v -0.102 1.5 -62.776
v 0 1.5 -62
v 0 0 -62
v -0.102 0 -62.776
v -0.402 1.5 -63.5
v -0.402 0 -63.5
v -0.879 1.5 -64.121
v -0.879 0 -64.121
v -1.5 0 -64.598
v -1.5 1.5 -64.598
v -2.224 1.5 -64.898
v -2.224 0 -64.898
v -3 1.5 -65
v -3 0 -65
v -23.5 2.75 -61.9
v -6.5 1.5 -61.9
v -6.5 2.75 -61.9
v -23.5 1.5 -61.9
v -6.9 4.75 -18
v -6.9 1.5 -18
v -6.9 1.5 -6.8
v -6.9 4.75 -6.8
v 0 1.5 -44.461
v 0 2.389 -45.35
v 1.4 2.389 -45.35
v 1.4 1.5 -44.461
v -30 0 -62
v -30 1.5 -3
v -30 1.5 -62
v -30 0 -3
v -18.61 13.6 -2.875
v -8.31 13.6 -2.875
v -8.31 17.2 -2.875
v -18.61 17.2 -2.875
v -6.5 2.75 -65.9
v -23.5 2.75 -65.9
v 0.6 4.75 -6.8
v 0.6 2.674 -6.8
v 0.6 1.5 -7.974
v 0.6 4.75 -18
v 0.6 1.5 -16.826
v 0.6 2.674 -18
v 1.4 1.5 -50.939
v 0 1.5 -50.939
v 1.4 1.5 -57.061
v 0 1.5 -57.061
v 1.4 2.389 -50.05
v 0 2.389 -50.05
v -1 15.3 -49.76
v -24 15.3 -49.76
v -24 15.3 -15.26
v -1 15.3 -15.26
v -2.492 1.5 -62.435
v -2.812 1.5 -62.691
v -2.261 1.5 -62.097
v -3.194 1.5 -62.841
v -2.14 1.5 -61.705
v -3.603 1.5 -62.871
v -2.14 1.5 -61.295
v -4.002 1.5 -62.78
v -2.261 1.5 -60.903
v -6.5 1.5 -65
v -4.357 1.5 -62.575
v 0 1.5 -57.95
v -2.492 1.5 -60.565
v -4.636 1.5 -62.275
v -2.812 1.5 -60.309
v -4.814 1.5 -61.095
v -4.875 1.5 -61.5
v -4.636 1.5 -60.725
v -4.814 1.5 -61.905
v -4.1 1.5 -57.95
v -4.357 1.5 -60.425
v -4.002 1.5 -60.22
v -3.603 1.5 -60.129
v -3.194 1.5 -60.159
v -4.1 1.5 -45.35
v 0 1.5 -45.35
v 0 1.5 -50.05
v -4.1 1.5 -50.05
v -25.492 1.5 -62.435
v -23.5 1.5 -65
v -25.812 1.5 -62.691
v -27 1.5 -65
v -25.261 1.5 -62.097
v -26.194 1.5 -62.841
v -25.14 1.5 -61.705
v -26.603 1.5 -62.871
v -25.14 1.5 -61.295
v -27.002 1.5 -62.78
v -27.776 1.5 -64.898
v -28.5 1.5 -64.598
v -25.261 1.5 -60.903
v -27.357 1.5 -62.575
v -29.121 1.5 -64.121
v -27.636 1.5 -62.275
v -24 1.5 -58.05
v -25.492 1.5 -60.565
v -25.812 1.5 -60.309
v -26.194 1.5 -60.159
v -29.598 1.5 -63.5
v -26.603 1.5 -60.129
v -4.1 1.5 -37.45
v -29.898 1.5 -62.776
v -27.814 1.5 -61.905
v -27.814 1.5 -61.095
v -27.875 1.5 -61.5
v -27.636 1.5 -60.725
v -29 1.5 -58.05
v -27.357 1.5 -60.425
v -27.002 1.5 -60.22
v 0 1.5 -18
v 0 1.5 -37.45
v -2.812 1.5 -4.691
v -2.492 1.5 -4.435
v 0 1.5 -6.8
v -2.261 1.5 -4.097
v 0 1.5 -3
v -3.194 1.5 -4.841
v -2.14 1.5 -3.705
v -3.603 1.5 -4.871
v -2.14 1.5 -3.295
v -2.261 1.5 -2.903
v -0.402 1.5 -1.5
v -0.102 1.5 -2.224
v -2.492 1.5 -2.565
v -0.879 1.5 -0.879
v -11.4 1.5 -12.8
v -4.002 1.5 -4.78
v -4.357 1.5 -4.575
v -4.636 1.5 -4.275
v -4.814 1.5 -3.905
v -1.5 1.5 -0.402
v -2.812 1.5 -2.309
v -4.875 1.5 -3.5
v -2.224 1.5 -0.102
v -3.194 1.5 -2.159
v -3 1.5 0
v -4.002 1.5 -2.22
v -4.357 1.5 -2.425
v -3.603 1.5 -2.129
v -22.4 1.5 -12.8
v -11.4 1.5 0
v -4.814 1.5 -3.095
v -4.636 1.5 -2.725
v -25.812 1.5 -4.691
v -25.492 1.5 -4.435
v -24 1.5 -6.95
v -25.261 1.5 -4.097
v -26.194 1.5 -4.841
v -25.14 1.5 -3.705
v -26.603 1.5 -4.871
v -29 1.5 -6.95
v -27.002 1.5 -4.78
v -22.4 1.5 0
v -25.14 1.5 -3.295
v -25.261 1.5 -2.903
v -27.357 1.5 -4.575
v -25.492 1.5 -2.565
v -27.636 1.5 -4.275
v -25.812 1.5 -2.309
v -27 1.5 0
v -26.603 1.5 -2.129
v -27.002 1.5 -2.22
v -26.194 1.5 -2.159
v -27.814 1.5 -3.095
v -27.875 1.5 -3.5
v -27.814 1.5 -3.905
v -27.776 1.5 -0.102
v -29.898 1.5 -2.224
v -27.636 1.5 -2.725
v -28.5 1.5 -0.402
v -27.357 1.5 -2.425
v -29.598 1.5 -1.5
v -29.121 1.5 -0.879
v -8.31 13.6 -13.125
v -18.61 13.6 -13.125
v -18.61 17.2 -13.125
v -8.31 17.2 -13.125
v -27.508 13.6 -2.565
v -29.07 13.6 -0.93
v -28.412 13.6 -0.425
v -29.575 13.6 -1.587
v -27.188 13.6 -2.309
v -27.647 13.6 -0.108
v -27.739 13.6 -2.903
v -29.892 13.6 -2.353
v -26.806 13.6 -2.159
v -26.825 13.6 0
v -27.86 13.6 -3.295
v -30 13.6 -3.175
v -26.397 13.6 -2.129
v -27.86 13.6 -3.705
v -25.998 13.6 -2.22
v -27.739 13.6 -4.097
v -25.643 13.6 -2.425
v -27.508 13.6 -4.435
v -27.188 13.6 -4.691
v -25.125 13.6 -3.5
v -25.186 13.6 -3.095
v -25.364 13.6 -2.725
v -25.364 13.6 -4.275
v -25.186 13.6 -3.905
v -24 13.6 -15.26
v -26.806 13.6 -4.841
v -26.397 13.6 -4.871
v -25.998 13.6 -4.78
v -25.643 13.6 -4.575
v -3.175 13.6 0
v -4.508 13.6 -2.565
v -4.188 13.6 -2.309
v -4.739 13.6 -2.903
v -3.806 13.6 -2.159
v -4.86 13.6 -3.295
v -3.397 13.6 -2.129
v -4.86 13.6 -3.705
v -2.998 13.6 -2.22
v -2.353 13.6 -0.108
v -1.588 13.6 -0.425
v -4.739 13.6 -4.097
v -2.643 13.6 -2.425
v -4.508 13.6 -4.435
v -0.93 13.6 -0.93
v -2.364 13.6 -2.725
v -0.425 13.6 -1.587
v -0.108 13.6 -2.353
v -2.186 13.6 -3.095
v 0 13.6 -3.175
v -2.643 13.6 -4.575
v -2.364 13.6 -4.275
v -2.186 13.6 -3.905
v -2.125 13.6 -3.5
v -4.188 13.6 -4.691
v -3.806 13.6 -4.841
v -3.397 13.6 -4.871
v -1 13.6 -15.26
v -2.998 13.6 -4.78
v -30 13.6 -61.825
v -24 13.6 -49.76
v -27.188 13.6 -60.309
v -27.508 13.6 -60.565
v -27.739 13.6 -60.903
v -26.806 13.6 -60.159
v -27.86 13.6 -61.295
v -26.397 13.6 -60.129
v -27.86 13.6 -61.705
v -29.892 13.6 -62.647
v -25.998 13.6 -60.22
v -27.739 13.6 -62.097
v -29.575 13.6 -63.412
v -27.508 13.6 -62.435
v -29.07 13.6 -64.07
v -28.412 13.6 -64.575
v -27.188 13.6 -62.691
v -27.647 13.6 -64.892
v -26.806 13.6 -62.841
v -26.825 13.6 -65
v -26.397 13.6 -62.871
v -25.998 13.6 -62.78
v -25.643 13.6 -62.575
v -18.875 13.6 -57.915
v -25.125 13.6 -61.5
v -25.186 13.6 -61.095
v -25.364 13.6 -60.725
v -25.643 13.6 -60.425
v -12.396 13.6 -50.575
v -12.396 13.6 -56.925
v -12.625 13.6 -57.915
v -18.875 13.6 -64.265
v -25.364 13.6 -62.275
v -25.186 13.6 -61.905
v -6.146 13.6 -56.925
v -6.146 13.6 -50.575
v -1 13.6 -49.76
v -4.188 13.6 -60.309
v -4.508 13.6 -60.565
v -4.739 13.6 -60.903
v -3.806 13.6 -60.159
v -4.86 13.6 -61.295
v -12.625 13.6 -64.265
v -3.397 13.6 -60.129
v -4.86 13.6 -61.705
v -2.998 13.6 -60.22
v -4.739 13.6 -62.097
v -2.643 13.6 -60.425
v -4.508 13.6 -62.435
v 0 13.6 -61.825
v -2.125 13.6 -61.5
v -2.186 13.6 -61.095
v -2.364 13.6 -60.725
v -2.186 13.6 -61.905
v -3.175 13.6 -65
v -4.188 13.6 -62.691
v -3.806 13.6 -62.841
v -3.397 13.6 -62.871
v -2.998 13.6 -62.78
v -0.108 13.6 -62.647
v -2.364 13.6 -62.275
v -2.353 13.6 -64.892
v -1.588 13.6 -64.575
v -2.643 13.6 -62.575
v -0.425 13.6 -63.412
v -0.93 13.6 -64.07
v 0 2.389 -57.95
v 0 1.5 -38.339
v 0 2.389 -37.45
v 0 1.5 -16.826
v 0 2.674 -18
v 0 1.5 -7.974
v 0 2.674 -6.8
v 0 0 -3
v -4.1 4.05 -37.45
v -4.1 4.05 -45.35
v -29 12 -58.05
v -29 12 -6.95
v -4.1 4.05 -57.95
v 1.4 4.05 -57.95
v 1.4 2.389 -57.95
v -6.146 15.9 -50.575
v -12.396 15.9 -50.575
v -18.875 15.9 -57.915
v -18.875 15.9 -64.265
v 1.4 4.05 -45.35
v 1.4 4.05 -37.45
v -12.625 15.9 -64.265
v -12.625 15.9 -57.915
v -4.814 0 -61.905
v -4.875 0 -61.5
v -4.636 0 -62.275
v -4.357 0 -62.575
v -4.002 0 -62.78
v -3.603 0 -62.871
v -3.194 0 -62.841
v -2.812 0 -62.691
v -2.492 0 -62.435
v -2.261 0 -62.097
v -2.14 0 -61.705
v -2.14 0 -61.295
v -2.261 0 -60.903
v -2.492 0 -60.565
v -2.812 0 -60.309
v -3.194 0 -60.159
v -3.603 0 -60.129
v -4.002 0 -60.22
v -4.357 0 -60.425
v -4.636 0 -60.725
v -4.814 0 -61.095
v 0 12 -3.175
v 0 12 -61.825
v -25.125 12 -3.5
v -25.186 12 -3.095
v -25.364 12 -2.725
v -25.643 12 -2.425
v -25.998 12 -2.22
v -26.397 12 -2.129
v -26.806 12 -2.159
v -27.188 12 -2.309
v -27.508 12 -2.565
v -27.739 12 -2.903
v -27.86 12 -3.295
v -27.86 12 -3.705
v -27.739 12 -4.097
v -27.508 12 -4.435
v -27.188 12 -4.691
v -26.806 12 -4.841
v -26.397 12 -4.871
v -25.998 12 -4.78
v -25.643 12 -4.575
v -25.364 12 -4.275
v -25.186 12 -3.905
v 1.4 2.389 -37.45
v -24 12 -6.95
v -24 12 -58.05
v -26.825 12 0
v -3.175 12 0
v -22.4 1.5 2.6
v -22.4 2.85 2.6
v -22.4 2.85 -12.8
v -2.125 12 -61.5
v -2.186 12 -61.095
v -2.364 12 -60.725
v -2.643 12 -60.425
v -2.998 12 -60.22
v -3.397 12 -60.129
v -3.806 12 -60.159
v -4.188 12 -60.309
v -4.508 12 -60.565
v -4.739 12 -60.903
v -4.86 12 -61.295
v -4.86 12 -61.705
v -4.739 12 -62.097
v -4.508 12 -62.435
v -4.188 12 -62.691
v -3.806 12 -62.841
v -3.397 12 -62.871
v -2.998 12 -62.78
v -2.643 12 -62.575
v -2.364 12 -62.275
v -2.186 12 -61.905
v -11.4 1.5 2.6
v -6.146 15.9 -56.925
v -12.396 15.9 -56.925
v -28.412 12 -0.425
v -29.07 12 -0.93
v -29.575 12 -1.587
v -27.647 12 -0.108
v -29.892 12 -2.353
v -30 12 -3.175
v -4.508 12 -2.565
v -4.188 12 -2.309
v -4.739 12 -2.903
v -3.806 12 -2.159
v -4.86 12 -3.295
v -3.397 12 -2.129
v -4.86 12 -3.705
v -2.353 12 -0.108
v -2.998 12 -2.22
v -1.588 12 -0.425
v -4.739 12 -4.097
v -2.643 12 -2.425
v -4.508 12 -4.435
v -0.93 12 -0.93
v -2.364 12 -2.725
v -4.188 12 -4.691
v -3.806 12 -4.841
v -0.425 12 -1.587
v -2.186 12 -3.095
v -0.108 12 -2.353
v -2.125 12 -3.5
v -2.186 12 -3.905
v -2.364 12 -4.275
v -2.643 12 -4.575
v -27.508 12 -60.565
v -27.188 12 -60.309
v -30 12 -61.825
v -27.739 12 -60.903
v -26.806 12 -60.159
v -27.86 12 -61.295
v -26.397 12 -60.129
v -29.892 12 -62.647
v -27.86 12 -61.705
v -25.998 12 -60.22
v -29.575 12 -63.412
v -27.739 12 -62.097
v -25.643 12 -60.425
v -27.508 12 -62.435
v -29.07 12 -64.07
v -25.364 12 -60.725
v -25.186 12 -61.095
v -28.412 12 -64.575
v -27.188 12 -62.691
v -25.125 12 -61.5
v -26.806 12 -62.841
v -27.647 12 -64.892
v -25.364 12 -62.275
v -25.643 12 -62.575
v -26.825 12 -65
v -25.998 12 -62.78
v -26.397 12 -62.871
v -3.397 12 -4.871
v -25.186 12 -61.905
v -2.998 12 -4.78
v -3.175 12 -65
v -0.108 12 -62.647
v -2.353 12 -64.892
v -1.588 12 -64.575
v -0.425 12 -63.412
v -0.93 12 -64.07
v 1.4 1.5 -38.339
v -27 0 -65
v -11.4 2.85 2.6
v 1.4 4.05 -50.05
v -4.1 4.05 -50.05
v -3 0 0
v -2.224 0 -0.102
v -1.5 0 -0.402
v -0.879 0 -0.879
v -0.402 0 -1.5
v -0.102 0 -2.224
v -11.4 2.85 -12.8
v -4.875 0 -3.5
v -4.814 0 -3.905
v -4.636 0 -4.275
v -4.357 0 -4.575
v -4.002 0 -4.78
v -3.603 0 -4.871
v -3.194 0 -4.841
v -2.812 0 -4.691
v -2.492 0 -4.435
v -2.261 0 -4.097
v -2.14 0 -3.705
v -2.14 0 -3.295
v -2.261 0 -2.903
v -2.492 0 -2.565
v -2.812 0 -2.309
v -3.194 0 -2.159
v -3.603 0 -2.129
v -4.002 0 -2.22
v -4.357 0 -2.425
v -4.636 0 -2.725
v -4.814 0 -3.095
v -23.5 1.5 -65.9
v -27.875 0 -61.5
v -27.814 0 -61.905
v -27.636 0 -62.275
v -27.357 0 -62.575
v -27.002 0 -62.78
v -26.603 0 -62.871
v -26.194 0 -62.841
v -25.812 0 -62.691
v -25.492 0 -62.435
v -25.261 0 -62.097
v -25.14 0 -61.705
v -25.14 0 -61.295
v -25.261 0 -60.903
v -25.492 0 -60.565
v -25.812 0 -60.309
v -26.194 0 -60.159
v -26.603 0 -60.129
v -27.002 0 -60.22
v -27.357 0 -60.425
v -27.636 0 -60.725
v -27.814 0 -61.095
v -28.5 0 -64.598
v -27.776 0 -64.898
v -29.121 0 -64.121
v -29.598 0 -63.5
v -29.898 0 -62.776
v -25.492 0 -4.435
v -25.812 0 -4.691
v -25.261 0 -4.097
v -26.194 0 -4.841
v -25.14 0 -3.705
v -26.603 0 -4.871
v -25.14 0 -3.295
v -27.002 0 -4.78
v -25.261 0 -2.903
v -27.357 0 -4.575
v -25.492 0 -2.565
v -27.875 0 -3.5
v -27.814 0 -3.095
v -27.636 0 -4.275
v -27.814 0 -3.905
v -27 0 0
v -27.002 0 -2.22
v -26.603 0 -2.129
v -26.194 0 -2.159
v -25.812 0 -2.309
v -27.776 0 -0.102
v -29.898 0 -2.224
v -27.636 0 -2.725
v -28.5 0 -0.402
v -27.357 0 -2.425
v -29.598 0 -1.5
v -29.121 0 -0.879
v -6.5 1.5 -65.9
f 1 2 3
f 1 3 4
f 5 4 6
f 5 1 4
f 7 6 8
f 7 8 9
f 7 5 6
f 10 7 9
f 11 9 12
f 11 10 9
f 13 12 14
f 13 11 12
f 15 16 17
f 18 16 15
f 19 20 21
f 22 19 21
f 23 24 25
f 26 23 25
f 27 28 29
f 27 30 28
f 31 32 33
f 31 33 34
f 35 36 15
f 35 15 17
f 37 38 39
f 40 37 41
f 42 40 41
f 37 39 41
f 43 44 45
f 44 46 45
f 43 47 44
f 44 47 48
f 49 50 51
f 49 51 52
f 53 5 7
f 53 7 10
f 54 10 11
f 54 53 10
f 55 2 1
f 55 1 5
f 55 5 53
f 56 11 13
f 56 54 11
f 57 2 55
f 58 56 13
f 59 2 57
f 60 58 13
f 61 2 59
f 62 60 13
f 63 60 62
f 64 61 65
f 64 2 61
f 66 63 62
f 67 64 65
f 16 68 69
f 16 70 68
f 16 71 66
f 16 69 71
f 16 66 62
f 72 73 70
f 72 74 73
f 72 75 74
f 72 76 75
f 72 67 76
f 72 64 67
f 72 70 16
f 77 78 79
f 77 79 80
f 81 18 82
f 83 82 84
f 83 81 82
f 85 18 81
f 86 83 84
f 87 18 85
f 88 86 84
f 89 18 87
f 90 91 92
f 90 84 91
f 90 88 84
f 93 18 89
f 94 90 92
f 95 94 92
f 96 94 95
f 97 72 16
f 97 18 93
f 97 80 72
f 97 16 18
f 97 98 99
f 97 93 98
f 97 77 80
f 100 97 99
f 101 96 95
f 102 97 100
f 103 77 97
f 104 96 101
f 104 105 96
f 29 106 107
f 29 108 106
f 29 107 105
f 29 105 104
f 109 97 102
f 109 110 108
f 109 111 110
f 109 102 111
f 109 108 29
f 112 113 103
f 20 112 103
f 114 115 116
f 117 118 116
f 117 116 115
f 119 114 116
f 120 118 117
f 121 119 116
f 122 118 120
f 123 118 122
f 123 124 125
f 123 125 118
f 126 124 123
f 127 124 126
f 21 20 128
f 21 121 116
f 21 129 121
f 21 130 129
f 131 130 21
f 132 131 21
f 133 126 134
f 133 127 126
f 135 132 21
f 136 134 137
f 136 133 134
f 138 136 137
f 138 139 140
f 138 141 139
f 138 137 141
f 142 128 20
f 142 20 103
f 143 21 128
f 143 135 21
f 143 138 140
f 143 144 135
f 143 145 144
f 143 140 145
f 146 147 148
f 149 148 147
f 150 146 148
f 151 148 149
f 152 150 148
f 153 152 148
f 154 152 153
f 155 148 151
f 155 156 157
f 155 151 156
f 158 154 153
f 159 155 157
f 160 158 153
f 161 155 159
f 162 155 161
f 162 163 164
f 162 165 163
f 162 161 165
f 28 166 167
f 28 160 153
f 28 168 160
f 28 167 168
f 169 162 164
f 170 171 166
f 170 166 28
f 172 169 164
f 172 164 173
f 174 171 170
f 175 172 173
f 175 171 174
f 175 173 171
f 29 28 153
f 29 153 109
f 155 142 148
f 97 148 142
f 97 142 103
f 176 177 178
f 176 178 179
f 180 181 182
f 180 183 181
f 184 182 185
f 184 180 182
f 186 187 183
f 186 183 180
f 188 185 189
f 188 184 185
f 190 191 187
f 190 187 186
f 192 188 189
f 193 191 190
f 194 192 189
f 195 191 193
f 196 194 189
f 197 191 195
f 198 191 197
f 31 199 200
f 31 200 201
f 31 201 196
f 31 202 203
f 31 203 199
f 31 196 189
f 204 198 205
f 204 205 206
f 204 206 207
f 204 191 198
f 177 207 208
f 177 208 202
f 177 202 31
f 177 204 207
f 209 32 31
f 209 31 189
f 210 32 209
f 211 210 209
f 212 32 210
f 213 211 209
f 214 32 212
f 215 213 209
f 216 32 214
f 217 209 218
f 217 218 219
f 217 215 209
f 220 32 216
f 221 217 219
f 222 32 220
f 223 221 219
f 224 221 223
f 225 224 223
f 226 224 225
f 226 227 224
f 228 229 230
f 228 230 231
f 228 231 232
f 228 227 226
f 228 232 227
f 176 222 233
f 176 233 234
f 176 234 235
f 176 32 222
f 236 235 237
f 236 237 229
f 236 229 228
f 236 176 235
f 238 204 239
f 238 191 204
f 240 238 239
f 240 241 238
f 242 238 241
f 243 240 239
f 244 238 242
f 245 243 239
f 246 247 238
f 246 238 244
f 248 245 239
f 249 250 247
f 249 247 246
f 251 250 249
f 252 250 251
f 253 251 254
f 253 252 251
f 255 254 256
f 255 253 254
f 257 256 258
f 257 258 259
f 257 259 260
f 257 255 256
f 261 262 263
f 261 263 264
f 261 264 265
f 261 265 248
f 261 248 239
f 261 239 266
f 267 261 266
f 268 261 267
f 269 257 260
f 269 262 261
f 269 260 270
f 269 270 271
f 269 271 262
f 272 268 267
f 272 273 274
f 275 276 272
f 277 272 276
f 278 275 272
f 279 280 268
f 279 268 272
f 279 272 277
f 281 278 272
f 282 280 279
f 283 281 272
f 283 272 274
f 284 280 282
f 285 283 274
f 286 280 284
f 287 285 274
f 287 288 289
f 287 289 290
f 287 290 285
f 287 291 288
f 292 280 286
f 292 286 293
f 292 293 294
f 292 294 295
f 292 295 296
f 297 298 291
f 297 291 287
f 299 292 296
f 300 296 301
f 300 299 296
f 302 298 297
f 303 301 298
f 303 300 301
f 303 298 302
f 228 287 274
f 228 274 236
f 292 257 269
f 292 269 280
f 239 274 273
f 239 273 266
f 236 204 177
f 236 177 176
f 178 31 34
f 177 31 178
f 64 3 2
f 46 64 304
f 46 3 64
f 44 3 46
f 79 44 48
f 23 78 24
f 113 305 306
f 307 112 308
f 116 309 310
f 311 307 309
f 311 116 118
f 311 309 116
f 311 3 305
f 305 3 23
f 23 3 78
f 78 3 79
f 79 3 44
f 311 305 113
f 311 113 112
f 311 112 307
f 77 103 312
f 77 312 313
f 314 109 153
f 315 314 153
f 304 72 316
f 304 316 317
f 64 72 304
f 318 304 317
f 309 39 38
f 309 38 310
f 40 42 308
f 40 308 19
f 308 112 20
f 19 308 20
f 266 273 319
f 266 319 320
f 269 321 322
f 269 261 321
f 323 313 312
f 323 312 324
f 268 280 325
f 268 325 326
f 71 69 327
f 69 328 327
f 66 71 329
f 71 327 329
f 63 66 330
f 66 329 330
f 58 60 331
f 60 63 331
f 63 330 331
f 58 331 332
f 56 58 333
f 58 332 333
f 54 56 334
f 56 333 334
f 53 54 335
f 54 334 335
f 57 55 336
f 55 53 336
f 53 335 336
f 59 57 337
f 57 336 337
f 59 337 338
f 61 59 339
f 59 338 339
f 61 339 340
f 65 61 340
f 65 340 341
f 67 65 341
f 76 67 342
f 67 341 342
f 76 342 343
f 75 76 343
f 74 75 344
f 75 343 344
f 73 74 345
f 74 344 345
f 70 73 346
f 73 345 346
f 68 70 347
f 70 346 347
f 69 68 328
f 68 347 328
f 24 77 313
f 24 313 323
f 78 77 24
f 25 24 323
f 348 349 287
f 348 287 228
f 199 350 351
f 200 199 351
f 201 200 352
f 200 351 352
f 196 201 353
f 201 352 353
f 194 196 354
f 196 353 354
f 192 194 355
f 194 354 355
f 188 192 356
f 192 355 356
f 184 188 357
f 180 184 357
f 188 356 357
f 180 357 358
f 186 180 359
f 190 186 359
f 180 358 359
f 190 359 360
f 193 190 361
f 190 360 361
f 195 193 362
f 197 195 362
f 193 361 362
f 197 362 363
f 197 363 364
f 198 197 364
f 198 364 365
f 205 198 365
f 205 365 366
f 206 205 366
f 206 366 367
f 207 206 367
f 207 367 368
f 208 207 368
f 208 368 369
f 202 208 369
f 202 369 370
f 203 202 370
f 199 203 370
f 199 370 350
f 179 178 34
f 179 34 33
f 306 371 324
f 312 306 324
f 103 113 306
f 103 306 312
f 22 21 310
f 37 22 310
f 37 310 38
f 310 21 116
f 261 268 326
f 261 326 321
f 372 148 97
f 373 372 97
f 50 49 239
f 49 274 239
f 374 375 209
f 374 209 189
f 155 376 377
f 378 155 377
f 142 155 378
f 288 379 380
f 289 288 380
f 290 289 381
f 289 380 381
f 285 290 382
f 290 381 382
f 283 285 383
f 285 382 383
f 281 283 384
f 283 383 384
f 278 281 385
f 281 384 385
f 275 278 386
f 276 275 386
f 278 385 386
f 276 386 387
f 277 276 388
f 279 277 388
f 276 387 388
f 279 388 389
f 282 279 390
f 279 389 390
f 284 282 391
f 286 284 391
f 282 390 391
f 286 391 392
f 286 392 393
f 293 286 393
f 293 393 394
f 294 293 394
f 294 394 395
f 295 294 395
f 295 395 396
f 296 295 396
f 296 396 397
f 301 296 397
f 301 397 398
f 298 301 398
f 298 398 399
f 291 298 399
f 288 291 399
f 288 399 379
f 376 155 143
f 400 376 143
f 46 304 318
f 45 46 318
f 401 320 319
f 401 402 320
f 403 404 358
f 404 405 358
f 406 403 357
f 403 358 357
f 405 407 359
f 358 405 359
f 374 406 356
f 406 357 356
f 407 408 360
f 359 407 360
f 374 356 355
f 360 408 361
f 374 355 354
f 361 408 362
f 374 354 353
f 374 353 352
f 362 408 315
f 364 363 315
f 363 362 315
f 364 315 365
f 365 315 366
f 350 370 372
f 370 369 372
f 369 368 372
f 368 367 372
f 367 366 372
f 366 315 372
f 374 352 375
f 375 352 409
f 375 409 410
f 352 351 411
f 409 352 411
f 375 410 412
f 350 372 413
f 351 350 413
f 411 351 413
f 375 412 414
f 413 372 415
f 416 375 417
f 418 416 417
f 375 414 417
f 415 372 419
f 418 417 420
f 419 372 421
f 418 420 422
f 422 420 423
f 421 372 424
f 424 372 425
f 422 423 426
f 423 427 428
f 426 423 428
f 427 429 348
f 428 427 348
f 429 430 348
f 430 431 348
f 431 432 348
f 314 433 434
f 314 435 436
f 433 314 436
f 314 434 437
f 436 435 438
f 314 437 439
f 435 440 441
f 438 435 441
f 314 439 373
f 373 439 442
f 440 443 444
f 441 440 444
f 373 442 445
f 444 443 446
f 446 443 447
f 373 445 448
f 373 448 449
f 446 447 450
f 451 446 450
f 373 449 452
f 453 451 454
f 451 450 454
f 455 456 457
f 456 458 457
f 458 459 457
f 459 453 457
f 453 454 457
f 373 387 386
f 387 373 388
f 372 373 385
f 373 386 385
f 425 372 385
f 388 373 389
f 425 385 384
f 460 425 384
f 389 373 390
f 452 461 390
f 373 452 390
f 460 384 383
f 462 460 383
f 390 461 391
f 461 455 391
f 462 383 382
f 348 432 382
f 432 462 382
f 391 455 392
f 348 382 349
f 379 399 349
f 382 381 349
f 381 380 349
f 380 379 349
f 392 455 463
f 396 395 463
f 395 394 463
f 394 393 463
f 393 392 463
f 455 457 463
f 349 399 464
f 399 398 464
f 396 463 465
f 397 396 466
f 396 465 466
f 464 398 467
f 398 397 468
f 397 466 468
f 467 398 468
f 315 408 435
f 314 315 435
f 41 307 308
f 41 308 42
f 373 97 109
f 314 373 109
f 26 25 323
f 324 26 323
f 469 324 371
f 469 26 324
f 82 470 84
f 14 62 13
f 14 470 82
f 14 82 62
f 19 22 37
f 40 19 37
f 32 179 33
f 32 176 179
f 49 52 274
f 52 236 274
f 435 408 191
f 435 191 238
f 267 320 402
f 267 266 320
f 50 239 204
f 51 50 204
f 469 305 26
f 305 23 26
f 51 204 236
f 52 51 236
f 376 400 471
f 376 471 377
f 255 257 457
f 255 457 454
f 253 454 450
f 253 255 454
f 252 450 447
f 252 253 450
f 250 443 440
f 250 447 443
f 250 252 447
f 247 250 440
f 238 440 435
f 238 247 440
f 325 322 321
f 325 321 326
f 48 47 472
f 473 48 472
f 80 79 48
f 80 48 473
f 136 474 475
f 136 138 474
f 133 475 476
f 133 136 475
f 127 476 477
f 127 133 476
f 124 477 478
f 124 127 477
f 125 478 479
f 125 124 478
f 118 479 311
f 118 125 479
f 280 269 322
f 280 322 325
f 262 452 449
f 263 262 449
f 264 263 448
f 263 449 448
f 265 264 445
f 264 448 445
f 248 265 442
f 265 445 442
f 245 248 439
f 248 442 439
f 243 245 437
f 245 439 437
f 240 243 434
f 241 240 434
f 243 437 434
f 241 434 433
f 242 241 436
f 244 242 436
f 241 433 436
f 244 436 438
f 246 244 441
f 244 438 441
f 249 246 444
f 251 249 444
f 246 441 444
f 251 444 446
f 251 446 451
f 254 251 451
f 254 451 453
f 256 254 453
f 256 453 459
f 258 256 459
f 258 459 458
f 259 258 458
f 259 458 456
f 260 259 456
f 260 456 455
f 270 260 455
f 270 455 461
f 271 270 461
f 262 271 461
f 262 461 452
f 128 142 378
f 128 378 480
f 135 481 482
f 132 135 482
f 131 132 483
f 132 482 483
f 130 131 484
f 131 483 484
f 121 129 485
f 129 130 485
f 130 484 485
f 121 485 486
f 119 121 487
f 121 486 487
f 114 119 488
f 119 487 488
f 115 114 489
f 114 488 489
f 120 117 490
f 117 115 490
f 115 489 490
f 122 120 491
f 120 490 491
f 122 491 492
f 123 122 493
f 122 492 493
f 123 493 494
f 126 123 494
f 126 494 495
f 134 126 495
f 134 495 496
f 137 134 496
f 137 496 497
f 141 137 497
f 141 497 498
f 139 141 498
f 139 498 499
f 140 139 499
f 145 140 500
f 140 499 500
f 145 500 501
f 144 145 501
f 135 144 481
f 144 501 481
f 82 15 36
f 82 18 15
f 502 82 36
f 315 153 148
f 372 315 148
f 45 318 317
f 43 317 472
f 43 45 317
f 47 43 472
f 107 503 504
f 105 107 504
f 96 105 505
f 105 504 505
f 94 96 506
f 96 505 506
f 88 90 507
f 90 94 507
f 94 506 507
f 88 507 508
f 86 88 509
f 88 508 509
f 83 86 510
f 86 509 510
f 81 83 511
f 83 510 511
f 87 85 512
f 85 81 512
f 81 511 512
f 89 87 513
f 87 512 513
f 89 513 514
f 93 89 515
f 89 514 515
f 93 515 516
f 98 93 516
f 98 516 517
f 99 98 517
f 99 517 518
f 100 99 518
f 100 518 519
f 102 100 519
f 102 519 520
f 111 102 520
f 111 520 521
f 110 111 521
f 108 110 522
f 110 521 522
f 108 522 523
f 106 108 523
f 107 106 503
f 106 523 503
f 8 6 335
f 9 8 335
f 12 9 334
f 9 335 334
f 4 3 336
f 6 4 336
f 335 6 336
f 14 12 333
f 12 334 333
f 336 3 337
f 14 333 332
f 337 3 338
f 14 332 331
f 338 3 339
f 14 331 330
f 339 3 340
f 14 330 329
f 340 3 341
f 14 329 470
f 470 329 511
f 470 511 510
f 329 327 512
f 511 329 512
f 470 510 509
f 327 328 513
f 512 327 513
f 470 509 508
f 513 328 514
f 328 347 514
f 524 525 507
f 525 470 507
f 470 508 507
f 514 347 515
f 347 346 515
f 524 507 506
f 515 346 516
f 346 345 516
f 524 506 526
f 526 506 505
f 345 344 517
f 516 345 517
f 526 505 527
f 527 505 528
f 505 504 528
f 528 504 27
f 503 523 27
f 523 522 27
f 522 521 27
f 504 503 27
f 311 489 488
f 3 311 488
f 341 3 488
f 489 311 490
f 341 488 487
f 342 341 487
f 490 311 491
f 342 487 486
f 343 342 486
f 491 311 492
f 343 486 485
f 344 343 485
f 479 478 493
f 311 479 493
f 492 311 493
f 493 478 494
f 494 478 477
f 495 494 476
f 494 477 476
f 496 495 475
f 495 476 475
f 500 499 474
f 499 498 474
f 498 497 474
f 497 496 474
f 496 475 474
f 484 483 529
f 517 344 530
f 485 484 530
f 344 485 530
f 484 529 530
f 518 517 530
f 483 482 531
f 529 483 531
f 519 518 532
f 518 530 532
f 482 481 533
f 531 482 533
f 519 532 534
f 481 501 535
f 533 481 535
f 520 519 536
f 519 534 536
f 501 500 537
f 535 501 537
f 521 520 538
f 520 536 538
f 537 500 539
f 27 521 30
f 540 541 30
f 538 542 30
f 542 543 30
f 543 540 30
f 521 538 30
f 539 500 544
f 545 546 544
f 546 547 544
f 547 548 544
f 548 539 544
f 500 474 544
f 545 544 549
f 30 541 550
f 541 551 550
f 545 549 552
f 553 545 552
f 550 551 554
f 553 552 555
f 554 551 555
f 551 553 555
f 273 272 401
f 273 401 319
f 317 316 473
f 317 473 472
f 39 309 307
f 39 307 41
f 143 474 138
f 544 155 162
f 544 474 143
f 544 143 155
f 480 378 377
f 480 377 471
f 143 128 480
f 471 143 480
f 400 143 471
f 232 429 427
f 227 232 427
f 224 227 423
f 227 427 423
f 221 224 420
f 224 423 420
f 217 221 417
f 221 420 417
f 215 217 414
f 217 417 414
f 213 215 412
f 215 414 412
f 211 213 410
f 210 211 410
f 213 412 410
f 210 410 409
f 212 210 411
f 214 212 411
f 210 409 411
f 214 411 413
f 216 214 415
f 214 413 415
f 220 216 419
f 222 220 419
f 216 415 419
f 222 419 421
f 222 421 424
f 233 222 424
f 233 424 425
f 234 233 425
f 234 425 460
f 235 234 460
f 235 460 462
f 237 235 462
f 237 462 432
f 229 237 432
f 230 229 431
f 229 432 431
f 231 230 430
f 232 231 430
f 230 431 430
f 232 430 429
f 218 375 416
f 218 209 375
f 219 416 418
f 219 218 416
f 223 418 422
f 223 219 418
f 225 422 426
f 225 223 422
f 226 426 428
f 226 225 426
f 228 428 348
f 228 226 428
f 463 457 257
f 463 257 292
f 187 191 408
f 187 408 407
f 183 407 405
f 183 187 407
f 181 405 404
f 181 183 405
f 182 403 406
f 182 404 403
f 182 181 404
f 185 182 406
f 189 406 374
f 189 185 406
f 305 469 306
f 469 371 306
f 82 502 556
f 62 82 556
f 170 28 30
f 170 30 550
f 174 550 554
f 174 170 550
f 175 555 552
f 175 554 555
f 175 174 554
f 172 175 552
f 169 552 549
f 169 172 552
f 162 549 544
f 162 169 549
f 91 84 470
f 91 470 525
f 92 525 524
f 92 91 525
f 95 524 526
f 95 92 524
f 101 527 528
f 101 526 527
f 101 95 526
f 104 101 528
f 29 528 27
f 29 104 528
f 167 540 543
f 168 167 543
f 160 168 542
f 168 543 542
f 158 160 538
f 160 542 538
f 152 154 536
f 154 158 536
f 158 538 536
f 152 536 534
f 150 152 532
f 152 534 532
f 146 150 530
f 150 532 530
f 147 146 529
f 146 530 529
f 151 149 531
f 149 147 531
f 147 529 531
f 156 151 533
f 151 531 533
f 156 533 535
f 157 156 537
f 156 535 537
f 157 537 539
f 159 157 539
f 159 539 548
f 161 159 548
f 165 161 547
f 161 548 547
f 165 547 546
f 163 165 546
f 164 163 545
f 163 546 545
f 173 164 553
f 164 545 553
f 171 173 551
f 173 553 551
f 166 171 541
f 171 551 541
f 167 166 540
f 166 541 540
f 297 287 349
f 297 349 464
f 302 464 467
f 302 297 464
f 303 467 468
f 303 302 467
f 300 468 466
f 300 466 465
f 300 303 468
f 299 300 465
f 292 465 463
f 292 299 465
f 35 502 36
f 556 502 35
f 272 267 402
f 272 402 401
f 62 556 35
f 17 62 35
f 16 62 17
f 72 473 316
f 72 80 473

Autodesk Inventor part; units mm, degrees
ref_plane "YZ Plane" through (0, 0, 0) normal (1, 0, 0) x (0, 1, 0)
ref_plane "XZ Plane" through (0, 0, 0) normal (0, 1, 0) x (-1, 0, 0)
ref_plane "XY Plane" through (0, 0, 0) normal (0, 0, 1) x (1, 0, 0)
sketch "Sketch1" plane through (0, 0, 0) normal (0, 1, 0) x (-1, 0, 0)
  line L0 (0, 0) -> (30, 0)
  line L1 (30, 0) -> (30, -65)
  line L2 (30, -65) -> (0, -65)
  line L3 (0, -65) -> (0, 0)
  circle A0 centre (26.5, -3.5) radius 1.375
  circle A1 centre (3.5, -3.5) radius 1.375
  circle A2 centre (26.5, -61.5) radius 1.375
  circle A3 centre (3.5, -61.5) radius 1.375
  line L4 (15, 0) -> (15, -65)
  line L5 (30, -32.5) -> (0, -32.5)
  dimension "d0" = 65
  dimension "d1" = 30
  dimension "d2" = 3.5
  dimension "d3" = 3.5
  dimension "d4" = 3.5
  dimension "d5" = 3.5
  dimension "d6" = 3.5
  dimension "d7" = 3.5
  dimension "d8" = 3.5
  dimension "d9" = 3.5
  dimension "d10" = 2.75
  dimension "d11" = 2.75
  dimension "d12" = 2.75
  dimension "d13" = 2.75
  dimension "d14" = 15
  dimension "d15" = 32.5
extrude "Extrusion1" add sketch "Sketch1" along normal blind 1.5
fillet "Fillet1" radius 3 4 edges at (-30, 0.75, 0) (0, 0.75, 0) (0, 0.75, -65) (-30, 0.75, -65)
sketch "Sketch2" plane through (0, 1.5, 0) normal (0, 1, 0) x (1, 0, 0)
  line L0 (-6.9, 6.8) -> (0.6, 6.8)
  line L1 (0.6, 6.8) -> (0.6, 18)
  line L2 (0.6, 18) -> (-6.9, 18)
  line L3 (-6.9, 18) -> (-6.9, 6.8)
  line L4 (-27, 0) -> (-3, 0) projected
  line L5 (-15, 0) -> (-15, 64.9233)
  line L6 (-30, 62) -> (-30, 3) projected
  line L7 (0.6, 12.4) -> (-6.9, 12.4)
  line L8 (-4.1, 57.95) -> (1.4, 57.95)
  line L9 (1.4, 57.95) -> (1.4, 50.05)
  line L10 (1.4, 50.05) -> (-4.1, 50.05)
  line L11 (-4.1, 50.05) -> (-4.1, 57.95)
  line L12 (-4.1, 45.35) -> (1.4, 45.35)
  line L13 (1.4, 45.35) -> (1.4, 37.45)
  line L14 (1.4, 37.45) -> (-4.1, 37.45)
  line L15 (-4.1, 37.45) -> (-4.1, 45.35)
  line L16 (-4.1, 41.4) -> (1.4, 41.4)
  line L17 (-4.1, 54) -> (1.4, 54)
  line L18 (-22.4, 12.8) -> (-11.4, 12.8)
  line L19 (-11.4, 12.8) -> (-11.4, -2.6)
  line L20 (-11.4, -2.6) -> (-22.4, -2.6)
  line L21 (-22.4, -2.6) -> (-22.4, 12.8)
  line L22 (-16.9, 12.8) -> (-16.9, -2.6)
  line L23 (0, 3) -> (0, 62) projected
  line L24 (-23.5, 65.9) -> (-6.5, 65.9)
  line L25 (-6.5, 65.9) -> (-6.5, 61.9)
  line L26 (-6.5, 61.9) -> (-23.5, 61.9)
  line L27 (-23.5, 61.9) -> (-23.5, 65.9)
  line L28 (-15, 65.9) -> (-15, 61.9)
  point P0 (0, 0)
  dimension "d19" = 11.2
  dimension "d20" = 7.5
  dimension "d21" = 15
  dimension "d23" = 12.4
  dimension "d24" = 7.9
  dimension "d25" = 7.9
  dimension "d26" = 5.5
  dimension "d27" = 3.95
  dimension "d28" = 3.95
  dimension "d29" = 41.4
  dimension "d30" = 54
  dimension "d32" = 30.6
  dimension "d33" = 31.4
  dimension "d34" = 11
  dimension "d35" = 15.4
  dimension "d36" = 2.6
  dimension "d37" = 5.5
  dimension "d38" = 16.9
  dimension "d39" = 65.9
  dimension "d40" = 4
  dimension "d41" = 17
  dimension "d42" = 8.5
  dimension "d43" = 15
extrude "Extrusion2" add sketch "Sketch2" along normal blind 3.25 contours L3 L7 L23 L0 | L23 L7 L1 L0 | L3 L2 L23 L7 | L23 L2 L1 L7
extrude "Extrusion3" add sketch "Sketch2" along normal blind 2.55 contours L10 L11 L17 L23 | L23 L17 L9 L10 | L14 L15 L16 L23 | L23 L16 L13 L14 | L23 L12 L13 L16 | L16 L15 L12 L23 | L23 L8 L9 L17 | L17 L11 L8 L23
extrude "Extrusion4" add sketch "Sketch2" along normal blind 1.25 contours L26 L27 L24 L28 L5 | L5 L28 L24 L25 L26
extrude "Extrusion5" add sketch "Sketch2" along normal blind 1.35 contours L21 L18 L22 L4 | L4 L22 L20 L21 | L22 L18 L5 L4 | L4 L19 L20 L22 | L5 L18 L19 L4
sketch "Sketch3" plane through (0, 1.5, 0) normal (0, 1, 0) x (1, 0, 0)
  line L0 (-29, 6.95) -> (-24, 6.95)
  line L1 (-24, 6.95) -> (-24, 58.05)
  line L2 (-24, 58.05) -> (-29, 58.05)
  line L3 (-29, 58.05) -> (-29, 6.95)
  line L4 (-26.5, 58.05) -> (-26.5, 6.95)
  circle A0 centre (-26.5, 3.5) radius 1.375 projected
  line L5 (-26.5, 3.5) -> (-26.5, 61.8145)
  line L6 (-27, 0) -> (-22.4, 0) projected
  point P0 (0, 0)
  dimension "d52" = 5
  dimension "d53" = 6.95
  dimension "d54" = 51.1
extrude "Extrusion6" add sketch "Sketch3" along normal blind 10.5 contours L3 L2 L4 L0 | L4 L2 L1 L0
chamfer "Chamfer1" distance 1.1735 angle 45 2 edges at (0.3, 1.5, -6.8) (0.3, 1.5, -18)
chamfer "Chamfer2" distance 0.889 angle 45 4 edges at (0.7, 1.5, -37.45) (0.7, 1.5, -45.35) (0.7, 1.5, -50.05) (0.7, 1.5, -57.95)
sketch "Sketch4" plane through (0, 12, 0) normal (0, 1, 0) x (1, 0, 0)
  line L0 (0, 0) -> (-30, 0)
  line L1 (-30, 0) -> (-30, 65)
  line L2 (-30, 65) -> (0, 65)
  line L3 (0, 65) -> (0, 0)
  circle A0 centre (-26.5, 3.5) radius 1.375 projected
  circle A1 centre (-26.5, 3.5) radius 1.375
  circle A2 centre (-3.5, 3.5) radius 1.375
  circle A3 centre (-3.5, 61.5) radius 1.375
  circle A4 centre (-26.5, 61.5) radius 1.375
  dimension "d63" = 30
  dimension "d64" = 65
  dimension "d67" = 3.5
  dimension "d68" = 3.5
  dimension "d69" = 3.5
  dimension "d70" = 3.5
  dimension "d71" = 3.5
  dimension "d72" = 3.5
  dimension "d73" = 3.5
  dimension "d74" = 3.5
extrude "Extrusion7" add sketch "Sketch4" along normal blind 1.6 contours L0 L1 L2 L3 | A0 | A2 | A3 | A4
extrude "Extrusion8" cut sketch "Sketch4" along normal blind 2 contours A0 | A2 | A3 | A4
fillet "Fillet2" radius 3.175 4 edges at (-30, 12.8, 0) (0, 12.8, 0) (0, 12.8, -65) (-30, 12.8, -65)
sketch "Sketch5" plane through (0, 13.6, 0) normal (0, 1, 0) x (1, 0, 0)
  line L0 (-18.875, 64.265) -> (-12.625, 64.265)
  line L1 (-12.625, 64.265) -> (-12.625, 57.915)
  line L2 (-12.625, 57.915) -> (-18.875, 57.915)
  line L3 (-18.875, 57.915) -> (-18.875, 64.265)
  line L4 (-12.396, 56.925) -> (-6.146, 56.925)
  line L5 (-6.146, 56.925) -> (-6.146, 50.575)
  line L6 (-6.146, 50.575) -> (-12.396, 50.575)
  line L7 (-12.396, 50.575) -> (-12.396, 56.925)
  line L8 (-18.61, 13.125) -> (-8.31, 13.125)
  line L9 (-8.31, 13.125) -> (-8.31, 2.875)
  line L10 (-8.31, 2.875) -> (-18.61, 2.875)
  line L11 (-18.61, 2.875) -> (-18.61, 13.125)
  line L12 (-18.875, 57.915) -> (-12.625, 64.265) construction
  line L13 (-18.875, 64.265) -> (-12.625, 57.915) construction
  line L14 (-18.61, 2.875) -> (-8.31, 13.125) construction
  line L15 (-18.61, 13.125) -> (-8.31, 2.875) construction
  line L16 (-26.825, 0) -> (-3.175, 0) construction
  line L17 (0, 3.175) -> (0, 61.825) construction
  line L18 (-12.396, 50.575) -> (-6.146, 56.925) construction
  line L19 (-12.396, 56.925) -> (-6.146, 50.575) construction
  line L20 (-3.175, 65) -> (-26.825, 65) construction
  line L21 (-30, 61.825) -> (-30, 3.175) construction
  line L22 (-24, 15.26) -> (-1, 15.26)
  line L23 (-1, 15.26) -> (-1, 49.76)
  line L24 (-1, 49.76) -> (-24, 49.76)
  line L25 (-24, 49.76) -> (-24, 15.26)
  line L26 (-24, 15.26) -> (-1, 49.76) construction
  line L27 (-24, 49.76) -> (-1, 15.26) construction
  point P0 (0, 0)
  point P1 (-13.46, 8)
  point P2 (-9.271, 53.75)
  point P3 (-15.75, 61.09)
  point P4 (-12.5, 32.51)
  dimension "d80" = 6.35
  dimension "d81" = 6.25
  dimension "d82" = 6.25
  dimension "d83" = 6.35
  dimension "d84" = 10.3
  dimension "d85" = 10.25
  dimension "d87" = 8
  dimension "d88" = 13.46
  dimension "d90" = 9.271
  dimension "d91" = 15.75
  dimension "d94" = 3.91
  dimension "d95" = 11.25
  dimension "d98" = 6
  dimension "d99" = 23
  dimension "d100" = 34.5
  dimension "d101" = 32.51
extrude "Extrusion9" add sketch "Sketch5" along normal blind 2.3 contours L0 L1 L2 L3 | L4 L5 L6 L7
extrude "Extrusion10" add sketch "Sketch5" along normal blind 3.6 contours L8 L9 L10 L11
extrude "Extrusion11" add sketch "Sketch5" along normal blind 1.7 contours L25 L24 L23 L22
equation "\"d3\" = d2"
equation "\"d4\" = d3"
equation "\"d5\" = d2"
equation "\"d6\" = d2"
equation "\"d7\" = d3"
equation "\"d8\" = d3"
equation "\"d9\" = d2"
equation "\"d11\" = d10"
equation "\"d12\" = d10"
equation "\"d13\" = d10"
equation "\"d14\" = 0.5 * d1"
equation "\"d15\" = 0.5 * d0"
equation "\"d21\" = d14"
equation "\"d25\" = d24"
equation "\"d27\" = 0.5 * d25"
equation "\"d37\" = 0.5 * d34"
equation "\"d42\" = 0.5 * d41"
equation "\"d43\" = d14"
equation "\"d53\" = -0.5 * d54 + 0.5 * d0"
equation "\"d67\" = d8"
equation "\"d68\" = d67"
equation "\"d69\" = d6"
equation "\"d70\" = d7"
equation "\"d71\" = d5"
equation "\"d72\" = d4"
equation "\"d83\" = d80"
properties part number "pizero_model" material "UHMW, Black"
